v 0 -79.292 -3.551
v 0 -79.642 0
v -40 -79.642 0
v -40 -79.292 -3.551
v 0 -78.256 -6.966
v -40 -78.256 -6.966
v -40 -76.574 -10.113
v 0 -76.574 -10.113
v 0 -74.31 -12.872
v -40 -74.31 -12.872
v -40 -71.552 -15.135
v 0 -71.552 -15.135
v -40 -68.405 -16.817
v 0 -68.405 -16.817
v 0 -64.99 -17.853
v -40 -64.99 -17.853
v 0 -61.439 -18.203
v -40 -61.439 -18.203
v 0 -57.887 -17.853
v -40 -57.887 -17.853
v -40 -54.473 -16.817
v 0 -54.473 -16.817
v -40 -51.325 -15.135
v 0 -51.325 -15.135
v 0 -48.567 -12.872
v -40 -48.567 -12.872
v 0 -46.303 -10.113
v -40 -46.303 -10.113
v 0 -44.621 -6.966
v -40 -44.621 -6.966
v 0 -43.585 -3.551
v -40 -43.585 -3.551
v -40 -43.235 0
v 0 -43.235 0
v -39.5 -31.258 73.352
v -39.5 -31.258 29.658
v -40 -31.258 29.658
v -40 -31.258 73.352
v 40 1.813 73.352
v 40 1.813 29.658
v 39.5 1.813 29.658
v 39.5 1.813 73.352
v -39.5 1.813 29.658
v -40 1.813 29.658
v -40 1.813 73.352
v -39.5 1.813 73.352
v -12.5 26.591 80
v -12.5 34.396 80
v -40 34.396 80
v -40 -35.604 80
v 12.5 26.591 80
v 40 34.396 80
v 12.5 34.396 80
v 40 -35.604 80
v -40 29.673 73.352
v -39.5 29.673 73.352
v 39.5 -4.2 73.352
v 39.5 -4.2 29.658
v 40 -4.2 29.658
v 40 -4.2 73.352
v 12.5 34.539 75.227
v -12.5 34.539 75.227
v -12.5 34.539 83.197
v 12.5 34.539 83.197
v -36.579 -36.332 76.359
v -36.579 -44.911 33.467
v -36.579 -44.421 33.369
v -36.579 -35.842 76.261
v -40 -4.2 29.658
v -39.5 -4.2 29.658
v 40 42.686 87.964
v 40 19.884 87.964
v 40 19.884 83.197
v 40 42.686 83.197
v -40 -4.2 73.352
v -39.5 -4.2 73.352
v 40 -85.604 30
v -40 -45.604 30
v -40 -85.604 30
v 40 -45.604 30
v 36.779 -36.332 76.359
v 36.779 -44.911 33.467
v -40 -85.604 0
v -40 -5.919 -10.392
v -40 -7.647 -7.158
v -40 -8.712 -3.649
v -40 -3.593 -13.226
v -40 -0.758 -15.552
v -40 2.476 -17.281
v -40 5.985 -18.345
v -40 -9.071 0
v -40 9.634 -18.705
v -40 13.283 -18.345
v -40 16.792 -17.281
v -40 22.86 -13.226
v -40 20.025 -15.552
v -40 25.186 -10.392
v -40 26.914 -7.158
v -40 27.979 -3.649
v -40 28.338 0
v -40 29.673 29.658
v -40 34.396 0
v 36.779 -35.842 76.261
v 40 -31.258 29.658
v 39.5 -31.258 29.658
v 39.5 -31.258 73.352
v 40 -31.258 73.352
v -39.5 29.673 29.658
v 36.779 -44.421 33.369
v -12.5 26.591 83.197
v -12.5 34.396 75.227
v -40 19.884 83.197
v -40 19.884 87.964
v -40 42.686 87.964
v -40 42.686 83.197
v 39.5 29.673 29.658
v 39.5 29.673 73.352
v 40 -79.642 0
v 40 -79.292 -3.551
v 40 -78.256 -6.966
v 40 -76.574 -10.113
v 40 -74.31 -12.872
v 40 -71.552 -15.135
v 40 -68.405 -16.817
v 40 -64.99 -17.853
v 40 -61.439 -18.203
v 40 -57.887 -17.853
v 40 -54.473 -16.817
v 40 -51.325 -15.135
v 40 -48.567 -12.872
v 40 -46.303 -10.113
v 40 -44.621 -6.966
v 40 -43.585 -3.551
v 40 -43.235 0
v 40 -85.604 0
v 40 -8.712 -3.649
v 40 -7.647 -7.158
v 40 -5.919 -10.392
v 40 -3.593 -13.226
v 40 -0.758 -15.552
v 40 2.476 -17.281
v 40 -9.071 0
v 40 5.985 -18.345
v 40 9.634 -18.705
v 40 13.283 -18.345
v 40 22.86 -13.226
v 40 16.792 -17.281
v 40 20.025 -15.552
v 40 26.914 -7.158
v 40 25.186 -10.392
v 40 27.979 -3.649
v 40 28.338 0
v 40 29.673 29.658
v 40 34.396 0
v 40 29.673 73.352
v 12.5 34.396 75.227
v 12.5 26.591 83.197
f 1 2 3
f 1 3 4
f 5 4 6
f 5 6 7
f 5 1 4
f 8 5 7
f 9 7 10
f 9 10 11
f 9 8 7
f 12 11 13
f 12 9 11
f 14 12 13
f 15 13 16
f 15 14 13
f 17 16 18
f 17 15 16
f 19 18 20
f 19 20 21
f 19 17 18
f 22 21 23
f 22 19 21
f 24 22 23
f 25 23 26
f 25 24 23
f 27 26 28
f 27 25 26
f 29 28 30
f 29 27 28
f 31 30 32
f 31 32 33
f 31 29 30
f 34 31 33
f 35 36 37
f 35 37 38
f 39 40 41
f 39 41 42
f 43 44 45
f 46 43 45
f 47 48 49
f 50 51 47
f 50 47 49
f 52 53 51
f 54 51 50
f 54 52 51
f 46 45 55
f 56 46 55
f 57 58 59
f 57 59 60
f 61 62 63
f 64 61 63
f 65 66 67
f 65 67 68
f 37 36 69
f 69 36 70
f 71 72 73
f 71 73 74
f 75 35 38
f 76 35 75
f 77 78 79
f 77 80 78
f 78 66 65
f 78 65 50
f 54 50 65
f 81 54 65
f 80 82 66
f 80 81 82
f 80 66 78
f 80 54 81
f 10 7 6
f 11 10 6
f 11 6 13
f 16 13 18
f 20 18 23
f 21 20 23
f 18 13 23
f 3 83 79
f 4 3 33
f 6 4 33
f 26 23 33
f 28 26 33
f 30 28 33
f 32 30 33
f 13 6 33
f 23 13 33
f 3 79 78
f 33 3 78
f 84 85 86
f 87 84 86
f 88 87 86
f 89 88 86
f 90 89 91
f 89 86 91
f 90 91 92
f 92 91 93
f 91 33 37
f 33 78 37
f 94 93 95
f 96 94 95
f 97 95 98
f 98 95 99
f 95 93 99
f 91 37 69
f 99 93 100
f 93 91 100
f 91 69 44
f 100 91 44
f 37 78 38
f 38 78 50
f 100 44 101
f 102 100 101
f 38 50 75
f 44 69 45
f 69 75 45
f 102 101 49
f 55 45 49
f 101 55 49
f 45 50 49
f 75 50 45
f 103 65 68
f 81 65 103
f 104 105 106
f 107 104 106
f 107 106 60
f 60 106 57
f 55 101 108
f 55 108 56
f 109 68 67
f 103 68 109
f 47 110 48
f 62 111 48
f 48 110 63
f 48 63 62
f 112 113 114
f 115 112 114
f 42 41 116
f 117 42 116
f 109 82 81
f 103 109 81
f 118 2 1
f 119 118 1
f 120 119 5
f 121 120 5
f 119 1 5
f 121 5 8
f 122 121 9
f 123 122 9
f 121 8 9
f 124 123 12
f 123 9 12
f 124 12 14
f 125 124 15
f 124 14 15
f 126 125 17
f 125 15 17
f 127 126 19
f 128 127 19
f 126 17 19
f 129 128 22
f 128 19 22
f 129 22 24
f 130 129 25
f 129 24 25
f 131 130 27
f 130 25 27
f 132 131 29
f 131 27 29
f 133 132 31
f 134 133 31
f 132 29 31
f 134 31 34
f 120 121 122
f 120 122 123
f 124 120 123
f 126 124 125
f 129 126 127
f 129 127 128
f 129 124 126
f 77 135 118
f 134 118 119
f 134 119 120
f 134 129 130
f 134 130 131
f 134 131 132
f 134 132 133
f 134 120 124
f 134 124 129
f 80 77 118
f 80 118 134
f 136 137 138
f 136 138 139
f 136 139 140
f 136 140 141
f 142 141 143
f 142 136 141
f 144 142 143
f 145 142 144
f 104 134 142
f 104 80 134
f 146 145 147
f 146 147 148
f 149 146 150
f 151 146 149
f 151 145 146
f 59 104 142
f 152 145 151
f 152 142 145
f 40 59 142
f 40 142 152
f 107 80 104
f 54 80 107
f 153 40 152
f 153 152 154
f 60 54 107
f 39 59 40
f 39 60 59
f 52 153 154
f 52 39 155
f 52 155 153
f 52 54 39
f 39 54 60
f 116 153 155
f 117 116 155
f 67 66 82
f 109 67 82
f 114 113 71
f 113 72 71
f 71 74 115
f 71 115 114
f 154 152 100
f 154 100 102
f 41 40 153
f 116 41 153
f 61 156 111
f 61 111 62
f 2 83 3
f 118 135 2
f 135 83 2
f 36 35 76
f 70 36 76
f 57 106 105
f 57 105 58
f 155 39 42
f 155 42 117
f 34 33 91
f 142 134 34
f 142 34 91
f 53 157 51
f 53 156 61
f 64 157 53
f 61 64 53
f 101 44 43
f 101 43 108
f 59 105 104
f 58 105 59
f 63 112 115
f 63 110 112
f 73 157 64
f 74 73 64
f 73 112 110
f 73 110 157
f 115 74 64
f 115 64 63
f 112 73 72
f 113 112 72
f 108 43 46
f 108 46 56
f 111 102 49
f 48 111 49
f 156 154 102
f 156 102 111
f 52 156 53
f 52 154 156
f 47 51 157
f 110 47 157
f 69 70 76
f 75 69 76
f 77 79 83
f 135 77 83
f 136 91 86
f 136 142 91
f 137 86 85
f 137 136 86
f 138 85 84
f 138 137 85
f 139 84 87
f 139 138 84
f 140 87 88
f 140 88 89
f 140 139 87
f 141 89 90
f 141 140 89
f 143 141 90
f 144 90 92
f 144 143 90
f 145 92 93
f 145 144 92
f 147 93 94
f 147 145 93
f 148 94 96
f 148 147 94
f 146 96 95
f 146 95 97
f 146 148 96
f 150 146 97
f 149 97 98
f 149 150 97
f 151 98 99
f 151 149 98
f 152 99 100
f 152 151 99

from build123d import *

# Parameters (mm, degrees)
F2_DEPTH  = 40
F1_R      = 18.2030638816
F1_R_2    = 18.7046022313
F3_DEPTH  = 40
F4_W      = 27.0581897348
F4_H      = 43.6939634383
F4_W_2    = 27.8599155135
F5_DEPTH  = 0.5
F6_W      = 73.3577571809
F6_H      = 43.7416750938
F7_DEPTH  = 0.5
F8_W      = 7.9477988183
F8_H      = 10.0772306323
F9_DEPTH  = 12.5
F10_W     = 22.8018909693
F10_H     = 4.7676712275
F11_DEPTH = 40


# Not quite as in the source:
# - a pattern or mirror of a feature is missing from the dataset's text; its kind, count and spacing are read off the source's solid
# - a feature names something its author has since deleted; it is built from what else it names


with BuildPart() as f2:
    # F0 (on Right) → F2 (new body, symmetric)
    with BuildSketch(Plane.YZ):
        Polygon((-85.6041714479, 30), (-85.6041714479, 0), (34.3958285521, 0), (34.3958285521, 80), (-35.6041714479, 80), (-45.6041714479, 30), align=None)
    extrude(amount=F2_DEPTH, both=True)

    # F1 (on Right) → F3 (join, symmetric)
    with BuildSketch(Plane.YZ):
        with Locations((-61.4385381341, 0)):
            Circle(F1_R)
        with Locations((9.633612819, 0)):
            Circle(F1_R_2)
    extrude(amount=F3_DEPTH, both=True)

    # F4 (on face) → F5 (cut, symmetric)
    with BuildSketch(Plane.YZ.offset(40)):
        with Locations((-17.7288064733, 51.5053849667)):
            Rectangle(F4_W, F4_H)
        with Locations((15.7431771513, 51.5053849667)):
            Rectangle(F4_W_2, F4_H)
    f5 = extrude(amount=F5_DEPTH, both=True, mode=Mode.SUBTRACT)

    # F5_copies: F5 across plane
    add(f5.mirror(Plane(origin=(0, 0, 0), x_dir=(0, 0, -1), z_dir=(-1, 0, 0))), mode=Mode.SUBTRACT)

    # F6 (on face) → F7 (cut, symmetric)
    with BuildSketch(Plane(origin=(0, -49.619395623, 9.9238791246), x_dir=(1, 0, 0), z_dir=(0, -0.9805806757, 0.1961161351))):
        with Locations((0.100215897, 45.8797877654)):
            Rectangle(F6_W, F6_H)
    extrude(amount=F7_DEPTH, both=True, mode=Mode.SUBTRACT)

    # F8 (on Right) → F9 (join, symmetric)
    with BuildSketch(Plane.YZ):
        with Locations((30.565129593, 80.2655704319)):
            Rectangle(F8_W, F8_H)
    extrude(amount=F9_DEPTH, both=True)

    # F10 (on Right) → F11 (join, symmetric)
    with BuildSketch(Plane.YZ):
        with Locations((31.2845855951, 85.5805724859)):
            Rectangle(F10_W, F10_H)
    extrude(amount=F11_DEPTH, both=True)


solid = f2.part
